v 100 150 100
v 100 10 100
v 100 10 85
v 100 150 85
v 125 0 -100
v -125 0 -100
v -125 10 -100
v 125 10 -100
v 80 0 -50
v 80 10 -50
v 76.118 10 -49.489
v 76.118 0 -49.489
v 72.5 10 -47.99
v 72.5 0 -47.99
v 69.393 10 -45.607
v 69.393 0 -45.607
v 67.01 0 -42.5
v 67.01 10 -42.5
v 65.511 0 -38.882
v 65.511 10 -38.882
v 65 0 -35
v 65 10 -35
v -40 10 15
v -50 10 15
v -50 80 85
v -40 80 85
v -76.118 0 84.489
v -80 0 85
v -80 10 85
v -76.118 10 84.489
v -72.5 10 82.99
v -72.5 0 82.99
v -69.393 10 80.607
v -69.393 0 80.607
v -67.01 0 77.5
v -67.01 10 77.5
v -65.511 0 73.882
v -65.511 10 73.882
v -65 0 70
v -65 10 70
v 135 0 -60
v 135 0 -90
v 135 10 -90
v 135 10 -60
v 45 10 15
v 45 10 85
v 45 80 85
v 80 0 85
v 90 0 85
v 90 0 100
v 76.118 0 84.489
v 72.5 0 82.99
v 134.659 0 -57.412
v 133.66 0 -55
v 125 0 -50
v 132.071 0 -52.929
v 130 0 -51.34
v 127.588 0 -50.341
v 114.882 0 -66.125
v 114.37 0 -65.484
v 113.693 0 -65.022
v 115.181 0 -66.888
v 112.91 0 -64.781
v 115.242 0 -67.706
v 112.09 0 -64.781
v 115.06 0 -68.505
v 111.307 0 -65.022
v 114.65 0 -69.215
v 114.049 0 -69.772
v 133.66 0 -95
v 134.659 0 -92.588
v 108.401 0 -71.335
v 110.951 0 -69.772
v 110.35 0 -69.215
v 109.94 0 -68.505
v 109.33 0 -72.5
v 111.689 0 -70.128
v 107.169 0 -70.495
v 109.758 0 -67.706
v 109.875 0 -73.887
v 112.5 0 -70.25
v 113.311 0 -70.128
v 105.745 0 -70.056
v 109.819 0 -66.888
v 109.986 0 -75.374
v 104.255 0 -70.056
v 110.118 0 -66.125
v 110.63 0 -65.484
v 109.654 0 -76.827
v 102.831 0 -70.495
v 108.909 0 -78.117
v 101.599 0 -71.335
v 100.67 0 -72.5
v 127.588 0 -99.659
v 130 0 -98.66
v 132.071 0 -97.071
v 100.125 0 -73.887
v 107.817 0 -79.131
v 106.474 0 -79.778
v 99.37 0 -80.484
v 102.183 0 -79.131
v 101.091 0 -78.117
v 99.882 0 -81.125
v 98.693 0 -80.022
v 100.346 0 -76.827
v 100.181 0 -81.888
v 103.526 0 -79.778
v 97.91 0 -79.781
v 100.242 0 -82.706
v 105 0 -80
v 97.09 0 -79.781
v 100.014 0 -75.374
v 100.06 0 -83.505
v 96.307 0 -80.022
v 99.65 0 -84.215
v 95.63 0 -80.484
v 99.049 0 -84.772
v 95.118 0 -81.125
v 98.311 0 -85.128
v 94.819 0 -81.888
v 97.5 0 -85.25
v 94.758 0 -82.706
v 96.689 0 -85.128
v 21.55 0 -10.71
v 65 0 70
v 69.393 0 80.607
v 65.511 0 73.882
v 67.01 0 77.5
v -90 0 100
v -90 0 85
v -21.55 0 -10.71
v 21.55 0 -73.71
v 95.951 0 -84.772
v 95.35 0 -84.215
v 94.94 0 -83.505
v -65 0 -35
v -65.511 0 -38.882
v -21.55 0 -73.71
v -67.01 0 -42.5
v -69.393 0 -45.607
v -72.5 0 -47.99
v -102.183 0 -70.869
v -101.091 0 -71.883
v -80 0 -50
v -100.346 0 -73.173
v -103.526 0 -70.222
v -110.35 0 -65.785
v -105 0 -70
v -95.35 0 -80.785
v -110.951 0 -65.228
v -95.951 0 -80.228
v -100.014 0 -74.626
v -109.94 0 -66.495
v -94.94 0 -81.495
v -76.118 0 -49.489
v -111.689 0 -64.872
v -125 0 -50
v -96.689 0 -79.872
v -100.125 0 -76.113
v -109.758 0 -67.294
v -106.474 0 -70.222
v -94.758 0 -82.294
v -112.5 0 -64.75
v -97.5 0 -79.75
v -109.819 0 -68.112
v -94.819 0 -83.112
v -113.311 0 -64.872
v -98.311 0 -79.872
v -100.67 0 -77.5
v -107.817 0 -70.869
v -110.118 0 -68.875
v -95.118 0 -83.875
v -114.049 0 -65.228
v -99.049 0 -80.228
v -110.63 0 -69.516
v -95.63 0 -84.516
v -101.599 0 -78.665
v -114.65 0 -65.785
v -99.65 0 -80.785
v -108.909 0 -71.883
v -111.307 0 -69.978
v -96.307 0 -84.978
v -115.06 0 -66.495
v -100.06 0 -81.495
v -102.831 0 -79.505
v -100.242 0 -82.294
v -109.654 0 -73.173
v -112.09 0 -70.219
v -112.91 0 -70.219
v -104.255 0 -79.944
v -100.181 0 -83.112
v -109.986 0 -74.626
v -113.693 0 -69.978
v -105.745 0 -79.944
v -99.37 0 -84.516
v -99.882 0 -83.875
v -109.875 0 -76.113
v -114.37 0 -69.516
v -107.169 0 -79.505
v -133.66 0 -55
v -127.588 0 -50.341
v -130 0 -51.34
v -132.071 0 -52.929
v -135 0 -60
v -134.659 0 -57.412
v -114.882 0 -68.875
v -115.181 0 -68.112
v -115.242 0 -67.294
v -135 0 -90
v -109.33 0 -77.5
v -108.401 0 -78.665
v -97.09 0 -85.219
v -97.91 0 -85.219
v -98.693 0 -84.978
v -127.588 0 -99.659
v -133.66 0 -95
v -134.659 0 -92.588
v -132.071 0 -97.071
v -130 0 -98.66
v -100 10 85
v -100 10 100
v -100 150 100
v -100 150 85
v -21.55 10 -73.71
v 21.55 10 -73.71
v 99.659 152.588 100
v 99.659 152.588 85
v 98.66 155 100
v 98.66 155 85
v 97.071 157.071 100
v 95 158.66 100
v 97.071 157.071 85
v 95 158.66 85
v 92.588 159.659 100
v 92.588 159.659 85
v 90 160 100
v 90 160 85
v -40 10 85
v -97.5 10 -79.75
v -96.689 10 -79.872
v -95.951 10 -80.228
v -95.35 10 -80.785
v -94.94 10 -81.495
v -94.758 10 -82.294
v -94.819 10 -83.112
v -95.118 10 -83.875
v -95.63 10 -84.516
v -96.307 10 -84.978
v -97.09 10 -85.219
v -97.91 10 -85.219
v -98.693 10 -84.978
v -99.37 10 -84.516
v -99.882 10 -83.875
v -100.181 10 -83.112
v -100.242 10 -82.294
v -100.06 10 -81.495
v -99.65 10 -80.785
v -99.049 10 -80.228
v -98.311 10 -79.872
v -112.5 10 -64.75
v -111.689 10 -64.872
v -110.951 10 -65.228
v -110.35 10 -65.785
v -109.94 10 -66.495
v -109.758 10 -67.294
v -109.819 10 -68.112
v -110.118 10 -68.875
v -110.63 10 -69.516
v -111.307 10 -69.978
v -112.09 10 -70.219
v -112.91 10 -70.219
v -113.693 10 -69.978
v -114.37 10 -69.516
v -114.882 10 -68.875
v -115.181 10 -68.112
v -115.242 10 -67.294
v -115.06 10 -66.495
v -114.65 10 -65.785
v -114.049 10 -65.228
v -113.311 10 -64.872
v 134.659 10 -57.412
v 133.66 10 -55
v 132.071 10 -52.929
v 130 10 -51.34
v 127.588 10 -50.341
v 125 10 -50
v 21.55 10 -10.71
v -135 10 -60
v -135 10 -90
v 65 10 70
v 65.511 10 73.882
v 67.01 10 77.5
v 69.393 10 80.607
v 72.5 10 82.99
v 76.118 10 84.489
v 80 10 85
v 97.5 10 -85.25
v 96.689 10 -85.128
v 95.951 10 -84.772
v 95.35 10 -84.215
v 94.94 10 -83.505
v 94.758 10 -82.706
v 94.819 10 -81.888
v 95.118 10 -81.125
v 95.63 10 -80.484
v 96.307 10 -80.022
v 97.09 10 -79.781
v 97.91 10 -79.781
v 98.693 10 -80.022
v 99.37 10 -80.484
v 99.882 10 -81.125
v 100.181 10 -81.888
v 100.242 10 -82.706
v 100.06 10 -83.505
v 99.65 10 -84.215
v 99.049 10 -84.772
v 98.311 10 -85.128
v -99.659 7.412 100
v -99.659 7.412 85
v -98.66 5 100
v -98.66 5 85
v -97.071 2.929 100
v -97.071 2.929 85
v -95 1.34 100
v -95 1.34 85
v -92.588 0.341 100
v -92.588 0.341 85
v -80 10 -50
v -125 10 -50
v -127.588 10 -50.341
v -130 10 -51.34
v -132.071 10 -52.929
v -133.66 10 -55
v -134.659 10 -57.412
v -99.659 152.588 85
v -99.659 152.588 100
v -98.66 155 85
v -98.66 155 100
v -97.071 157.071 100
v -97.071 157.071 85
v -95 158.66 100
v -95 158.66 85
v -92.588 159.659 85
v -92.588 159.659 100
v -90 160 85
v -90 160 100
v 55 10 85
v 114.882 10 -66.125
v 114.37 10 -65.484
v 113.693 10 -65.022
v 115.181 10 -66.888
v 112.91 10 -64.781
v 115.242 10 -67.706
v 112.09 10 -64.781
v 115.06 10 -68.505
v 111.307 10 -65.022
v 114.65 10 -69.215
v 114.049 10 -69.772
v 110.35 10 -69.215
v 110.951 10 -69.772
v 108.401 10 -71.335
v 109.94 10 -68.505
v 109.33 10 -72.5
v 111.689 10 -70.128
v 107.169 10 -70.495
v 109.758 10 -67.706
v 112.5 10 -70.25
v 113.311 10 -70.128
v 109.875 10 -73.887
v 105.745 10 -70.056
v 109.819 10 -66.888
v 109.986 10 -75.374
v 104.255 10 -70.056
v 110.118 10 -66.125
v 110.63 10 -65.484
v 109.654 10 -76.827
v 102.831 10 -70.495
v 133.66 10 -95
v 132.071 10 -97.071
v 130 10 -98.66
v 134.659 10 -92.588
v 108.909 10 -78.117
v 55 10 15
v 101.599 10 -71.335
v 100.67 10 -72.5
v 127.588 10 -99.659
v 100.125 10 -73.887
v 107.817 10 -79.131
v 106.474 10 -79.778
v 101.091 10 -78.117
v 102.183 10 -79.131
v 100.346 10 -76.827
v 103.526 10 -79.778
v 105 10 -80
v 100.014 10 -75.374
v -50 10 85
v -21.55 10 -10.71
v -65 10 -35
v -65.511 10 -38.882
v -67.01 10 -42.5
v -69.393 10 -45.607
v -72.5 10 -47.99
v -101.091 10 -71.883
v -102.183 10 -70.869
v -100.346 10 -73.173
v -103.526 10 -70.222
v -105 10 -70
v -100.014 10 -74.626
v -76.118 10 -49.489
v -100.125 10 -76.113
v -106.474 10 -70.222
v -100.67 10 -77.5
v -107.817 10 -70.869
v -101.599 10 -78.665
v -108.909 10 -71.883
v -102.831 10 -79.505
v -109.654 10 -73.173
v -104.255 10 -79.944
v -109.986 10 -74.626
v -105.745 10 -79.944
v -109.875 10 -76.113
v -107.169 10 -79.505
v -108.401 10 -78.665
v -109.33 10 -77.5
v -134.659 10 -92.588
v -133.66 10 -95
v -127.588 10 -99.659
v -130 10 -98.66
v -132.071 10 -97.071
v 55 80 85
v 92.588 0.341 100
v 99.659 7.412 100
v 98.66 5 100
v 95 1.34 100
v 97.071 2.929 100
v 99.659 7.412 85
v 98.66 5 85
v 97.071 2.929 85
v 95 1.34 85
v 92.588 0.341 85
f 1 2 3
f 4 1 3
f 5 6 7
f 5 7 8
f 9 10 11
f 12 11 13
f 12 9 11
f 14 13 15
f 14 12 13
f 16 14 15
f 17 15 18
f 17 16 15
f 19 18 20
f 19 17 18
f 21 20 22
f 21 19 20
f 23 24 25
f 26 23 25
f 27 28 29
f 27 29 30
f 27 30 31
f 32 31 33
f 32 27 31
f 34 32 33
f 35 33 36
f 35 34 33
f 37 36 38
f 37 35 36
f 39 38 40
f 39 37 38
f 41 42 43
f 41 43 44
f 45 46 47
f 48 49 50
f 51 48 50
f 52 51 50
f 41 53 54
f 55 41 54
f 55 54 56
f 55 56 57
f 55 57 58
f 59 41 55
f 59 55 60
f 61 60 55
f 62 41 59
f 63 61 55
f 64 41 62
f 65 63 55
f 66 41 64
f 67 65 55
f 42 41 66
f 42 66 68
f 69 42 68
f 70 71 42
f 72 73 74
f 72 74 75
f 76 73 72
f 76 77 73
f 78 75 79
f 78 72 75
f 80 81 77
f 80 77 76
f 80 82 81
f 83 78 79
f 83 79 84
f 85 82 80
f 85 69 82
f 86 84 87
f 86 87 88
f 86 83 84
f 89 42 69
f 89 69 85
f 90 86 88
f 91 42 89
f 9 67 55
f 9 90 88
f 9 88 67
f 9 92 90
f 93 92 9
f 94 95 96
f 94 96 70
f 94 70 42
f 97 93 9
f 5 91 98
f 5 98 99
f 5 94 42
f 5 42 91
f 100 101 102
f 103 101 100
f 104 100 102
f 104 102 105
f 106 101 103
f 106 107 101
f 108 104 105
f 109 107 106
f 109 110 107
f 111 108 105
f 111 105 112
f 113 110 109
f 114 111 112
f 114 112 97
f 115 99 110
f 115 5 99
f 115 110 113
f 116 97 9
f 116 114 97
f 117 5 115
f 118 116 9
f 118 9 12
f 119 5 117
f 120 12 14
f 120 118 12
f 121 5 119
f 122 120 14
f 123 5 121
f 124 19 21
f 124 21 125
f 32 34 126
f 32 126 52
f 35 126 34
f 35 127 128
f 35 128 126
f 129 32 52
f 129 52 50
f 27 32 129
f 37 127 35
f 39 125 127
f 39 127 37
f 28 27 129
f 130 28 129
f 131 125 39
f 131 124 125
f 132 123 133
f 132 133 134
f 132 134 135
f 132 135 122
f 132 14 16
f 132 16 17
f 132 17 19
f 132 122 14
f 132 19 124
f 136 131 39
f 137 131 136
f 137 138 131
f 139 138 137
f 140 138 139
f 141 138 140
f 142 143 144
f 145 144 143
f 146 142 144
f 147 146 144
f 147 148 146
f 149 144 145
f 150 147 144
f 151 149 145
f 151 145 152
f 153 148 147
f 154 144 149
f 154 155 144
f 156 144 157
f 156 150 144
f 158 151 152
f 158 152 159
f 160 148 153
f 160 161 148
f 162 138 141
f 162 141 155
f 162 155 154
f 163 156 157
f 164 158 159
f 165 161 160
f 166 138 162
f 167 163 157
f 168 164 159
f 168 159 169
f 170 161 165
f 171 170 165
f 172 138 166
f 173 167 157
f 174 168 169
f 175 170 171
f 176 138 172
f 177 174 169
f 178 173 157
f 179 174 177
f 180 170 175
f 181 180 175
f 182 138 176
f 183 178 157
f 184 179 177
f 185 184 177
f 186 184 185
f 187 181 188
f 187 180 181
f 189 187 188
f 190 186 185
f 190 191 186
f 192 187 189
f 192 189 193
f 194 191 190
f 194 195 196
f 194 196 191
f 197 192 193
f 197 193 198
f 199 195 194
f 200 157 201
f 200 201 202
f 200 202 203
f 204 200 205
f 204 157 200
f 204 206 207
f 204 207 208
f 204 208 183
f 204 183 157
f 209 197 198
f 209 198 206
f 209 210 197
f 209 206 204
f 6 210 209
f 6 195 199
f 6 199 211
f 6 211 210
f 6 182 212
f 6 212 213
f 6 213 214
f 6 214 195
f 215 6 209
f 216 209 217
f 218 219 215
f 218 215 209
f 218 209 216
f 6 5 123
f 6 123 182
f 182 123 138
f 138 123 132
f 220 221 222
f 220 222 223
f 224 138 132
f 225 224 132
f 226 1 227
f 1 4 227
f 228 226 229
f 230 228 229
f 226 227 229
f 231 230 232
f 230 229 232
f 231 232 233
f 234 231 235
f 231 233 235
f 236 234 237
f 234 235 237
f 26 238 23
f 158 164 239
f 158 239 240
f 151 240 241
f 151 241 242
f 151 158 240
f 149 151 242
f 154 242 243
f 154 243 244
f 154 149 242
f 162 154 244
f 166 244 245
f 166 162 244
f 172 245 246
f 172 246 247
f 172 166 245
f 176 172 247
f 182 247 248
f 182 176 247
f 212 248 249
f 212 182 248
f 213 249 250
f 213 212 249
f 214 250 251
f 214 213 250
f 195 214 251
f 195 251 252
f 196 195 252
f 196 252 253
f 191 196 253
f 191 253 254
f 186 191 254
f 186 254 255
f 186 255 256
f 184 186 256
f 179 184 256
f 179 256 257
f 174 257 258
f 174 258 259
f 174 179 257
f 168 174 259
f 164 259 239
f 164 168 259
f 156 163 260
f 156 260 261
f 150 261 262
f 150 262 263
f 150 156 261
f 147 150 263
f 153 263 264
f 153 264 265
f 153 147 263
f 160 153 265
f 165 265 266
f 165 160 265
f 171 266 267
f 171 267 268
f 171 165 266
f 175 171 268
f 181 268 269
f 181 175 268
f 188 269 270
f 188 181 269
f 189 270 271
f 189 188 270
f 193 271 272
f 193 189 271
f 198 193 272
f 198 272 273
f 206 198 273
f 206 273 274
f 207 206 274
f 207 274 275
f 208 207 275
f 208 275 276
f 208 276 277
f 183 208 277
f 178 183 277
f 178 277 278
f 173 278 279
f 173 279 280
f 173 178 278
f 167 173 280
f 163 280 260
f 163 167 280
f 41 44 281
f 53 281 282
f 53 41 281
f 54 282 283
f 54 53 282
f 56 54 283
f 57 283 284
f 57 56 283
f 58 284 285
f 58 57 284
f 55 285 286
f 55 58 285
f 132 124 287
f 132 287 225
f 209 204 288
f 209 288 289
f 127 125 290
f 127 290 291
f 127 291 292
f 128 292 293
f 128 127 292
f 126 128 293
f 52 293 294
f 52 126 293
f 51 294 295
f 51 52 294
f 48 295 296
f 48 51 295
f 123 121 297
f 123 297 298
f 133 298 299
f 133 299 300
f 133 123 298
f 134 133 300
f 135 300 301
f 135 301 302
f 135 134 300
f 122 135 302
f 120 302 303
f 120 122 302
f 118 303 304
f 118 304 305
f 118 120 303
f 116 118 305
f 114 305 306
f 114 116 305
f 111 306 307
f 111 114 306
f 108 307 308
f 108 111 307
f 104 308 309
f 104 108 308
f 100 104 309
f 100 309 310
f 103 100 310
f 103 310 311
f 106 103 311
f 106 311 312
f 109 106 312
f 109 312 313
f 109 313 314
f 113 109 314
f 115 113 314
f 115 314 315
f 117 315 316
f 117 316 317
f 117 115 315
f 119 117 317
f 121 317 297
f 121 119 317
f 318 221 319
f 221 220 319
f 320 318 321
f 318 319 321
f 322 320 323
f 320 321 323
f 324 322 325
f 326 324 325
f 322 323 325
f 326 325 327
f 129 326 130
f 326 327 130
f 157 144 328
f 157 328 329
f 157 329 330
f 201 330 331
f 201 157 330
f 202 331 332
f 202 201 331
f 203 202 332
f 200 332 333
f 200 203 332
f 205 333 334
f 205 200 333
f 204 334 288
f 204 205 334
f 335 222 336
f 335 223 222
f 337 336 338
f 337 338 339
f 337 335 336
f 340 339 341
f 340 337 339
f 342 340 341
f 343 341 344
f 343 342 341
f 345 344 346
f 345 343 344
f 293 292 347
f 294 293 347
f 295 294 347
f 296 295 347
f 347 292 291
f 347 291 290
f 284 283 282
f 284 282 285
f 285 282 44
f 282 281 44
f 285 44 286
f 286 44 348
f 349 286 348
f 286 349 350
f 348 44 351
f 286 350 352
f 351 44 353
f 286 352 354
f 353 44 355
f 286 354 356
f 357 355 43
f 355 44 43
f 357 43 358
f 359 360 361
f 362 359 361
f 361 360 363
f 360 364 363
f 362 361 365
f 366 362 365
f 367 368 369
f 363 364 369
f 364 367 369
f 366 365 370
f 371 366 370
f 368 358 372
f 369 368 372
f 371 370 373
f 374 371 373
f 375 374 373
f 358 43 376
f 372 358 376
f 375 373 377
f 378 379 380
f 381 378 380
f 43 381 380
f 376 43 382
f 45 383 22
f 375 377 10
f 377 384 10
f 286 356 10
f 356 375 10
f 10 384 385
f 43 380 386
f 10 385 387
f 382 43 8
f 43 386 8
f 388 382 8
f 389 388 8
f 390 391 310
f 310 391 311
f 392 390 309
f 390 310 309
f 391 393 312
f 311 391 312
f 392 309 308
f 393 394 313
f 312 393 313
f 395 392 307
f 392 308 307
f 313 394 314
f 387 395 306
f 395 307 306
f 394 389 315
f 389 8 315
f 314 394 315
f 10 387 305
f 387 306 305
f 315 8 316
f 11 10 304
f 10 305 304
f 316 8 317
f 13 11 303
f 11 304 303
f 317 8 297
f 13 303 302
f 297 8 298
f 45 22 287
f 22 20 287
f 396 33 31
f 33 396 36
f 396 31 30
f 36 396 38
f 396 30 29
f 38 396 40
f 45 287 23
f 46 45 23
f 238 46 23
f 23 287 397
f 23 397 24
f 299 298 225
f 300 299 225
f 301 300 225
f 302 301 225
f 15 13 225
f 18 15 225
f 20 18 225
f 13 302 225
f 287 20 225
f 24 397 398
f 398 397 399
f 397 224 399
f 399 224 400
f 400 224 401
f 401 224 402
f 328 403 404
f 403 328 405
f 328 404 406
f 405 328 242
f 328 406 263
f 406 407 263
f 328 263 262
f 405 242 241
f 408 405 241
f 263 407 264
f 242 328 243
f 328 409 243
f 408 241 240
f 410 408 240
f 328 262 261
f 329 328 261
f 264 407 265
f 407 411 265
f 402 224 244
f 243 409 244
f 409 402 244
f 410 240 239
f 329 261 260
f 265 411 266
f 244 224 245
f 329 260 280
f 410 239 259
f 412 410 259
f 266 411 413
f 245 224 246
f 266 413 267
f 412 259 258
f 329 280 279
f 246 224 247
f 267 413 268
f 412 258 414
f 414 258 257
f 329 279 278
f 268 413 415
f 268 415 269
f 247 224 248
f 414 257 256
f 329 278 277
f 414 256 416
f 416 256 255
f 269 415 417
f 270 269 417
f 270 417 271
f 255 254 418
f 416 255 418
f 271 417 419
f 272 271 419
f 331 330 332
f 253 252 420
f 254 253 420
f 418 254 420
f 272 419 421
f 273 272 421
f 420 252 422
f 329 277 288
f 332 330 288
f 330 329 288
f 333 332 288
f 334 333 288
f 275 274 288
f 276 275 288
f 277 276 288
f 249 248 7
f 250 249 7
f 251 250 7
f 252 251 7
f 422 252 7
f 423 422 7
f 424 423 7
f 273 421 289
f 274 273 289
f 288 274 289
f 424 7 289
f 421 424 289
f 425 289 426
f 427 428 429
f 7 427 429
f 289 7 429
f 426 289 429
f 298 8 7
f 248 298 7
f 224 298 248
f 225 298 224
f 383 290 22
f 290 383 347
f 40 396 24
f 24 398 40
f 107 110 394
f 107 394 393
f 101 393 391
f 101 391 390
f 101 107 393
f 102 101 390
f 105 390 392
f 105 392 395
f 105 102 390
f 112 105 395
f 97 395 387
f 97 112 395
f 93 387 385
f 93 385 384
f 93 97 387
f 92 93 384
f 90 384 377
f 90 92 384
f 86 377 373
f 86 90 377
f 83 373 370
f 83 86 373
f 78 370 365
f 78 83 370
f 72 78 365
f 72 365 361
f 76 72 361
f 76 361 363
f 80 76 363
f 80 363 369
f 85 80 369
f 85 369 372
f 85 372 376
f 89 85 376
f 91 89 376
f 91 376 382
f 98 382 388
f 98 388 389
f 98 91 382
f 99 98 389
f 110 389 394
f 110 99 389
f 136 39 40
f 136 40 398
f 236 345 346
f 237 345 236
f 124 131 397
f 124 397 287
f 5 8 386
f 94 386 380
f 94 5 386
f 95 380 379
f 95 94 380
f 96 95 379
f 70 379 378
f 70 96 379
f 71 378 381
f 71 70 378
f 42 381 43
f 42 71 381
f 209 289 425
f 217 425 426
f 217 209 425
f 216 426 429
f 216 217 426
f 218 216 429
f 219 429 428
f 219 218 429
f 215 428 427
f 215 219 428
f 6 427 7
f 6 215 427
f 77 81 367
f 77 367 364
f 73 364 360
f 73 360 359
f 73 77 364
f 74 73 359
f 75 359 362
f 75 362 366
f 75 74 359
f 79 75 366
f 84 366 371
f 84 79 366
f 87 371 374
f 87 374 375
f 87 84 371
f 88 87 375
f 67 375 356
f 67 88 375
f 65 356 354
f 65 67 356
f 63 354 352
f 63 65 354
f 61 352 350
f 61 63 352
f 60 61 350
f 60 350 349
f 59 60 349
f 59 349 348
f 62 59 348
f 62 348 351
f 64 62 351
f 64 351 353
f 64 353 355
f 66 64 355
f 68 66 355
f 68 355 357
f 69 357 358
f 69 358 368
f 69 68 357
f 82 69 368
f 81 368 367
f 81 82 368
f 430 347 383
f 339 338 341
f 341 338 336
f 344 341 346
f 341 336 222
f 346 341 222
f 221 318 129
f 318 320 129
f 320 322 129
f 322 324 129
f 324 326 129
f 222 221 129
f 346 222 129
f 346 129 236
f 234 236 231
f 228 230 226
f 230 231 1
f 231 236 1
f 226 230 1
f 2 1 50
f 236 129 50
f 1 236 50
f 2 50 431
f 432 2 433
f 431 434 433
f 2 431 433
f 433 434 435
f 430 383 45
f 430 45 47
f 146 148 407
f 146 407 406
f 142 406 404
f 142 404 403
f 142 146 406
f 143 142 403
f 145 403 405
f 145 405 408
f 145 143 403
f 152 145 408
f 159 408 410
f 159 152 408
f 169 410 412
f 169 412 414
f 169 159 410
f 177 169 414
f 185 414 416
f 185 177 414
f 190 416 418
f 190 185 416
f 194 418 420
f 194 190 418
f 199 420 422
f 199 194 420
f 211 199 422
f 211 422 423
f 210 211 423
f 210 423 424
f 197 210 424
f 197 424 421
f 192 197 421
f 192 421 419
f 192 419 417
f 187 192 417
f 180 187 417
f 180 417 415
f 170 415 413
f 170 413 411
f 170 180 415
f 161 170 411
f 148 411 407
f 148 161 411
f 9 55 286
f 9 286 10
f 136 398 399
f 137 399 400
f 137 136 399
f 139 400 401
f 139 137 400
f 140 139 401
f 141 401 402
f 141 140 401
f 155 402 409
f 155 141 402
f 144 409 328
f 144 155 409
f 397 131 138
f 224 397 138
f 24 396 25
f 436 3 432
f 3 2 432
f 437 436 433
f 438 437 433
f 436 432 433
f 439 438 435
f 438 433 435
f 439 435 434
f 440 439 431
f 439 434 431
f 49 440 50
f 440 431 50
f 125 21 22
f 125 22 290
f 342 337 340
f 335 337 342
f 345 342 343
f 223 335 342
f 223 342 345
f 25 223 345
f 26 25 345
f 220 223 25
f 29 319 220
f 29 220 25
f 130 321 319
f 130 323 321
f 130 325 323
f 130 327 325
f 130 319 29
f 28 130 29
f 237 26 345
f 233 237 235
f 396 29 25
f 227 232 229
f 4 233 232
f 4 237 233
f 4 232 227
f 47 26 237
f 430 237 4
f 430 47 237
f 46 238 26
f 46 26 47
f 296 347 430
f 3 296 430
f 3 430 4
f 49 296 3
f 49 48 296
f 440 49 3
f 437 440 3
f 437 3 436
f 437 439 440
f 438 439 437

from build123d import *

# Parameters (mm, degrees)
SKIZZE1_R                       = 5
SKIZZE1_R_2                     = 2.75
SKIZZE1_W                       = 43.1
SKIZZE1_H                       = 63
AUFSATZ_LINEAR_AUSTRAGEN1_DEPTH = 10
SKIZZE3_W                       = 200
SKIZZE3_H                       = 15
AUFSATZ_LINEAR_AUSTRAGEN2_DEPTH = 150
VERRUNDUNG1_R                   = 10
AUFSATZ_LINEAR_AUSTRAGEN3_DEPTH = 10
AUFSATZ_LINEAR_AUSTRAGEN4_DEPTH = 10


with BuildPart() as part:
    # Skizze1 → Aufsatz-Linear austragen1 (new body)
    with BuildSketch(Plane(origin=(0, 0, 0), x_dir=(1, 0, 0), z_dir=(0, 1, 0))):
        with BuildLine():
            Line((-125, 100), (125, 100))
            ThreePointArc((125, 100), (132.071067812, 97.071067812), (135, 90))
            Line((135, 90), (135, 60))
            ThreePointArc((135, 60), (132.071067812, 52.928932188), (125, 50))
            Line((125, 50), (80, 50))
            ThreePointArc((80, 50), (69.393398282, 45.606601718), (65, 35))
            Line((65, 35), (65, -70))
            ThreePointArc((65, -70), (69.393398282, -80.606601718), (80, -85))
            Line((80, -85), (90, -85))
            Line((90, -85), (100, -85))
            Line((100, -85), (100, -100))
            Line((100, -100), (80, -100))
            Line((80, -100), (-80, -100))
            Line((-80, -100), (-100, -100))
            Line((-100, -100), (-100, -85))
            Line((-100, -85), (-90, -85))
            Line((-90, -85), (-80, -85))
            ThreePointArc((-80, -85), (-69.393398282, -80.606601718), (-65, -70))
            Line((-65, -70), (-65, 35))
            ThreePointArc((-65, 35), (-69.393398282, 45.606601718), (-80, 50))
            Line((-80, 50), (-125, 50))
            ThreePointArc((-125, 50), (-132.071067812, 52.928932188), (-135, 60))
            Line((-135, 60), (-135, 90))
            ThreePointArc((-135, 90), (-132.071067812, 97.071067812), (-125, 100))
        make_face()
        with Locations(Location((-105, 75, 0), (0, 0, 270))):
            Circle(SKIZZE1_R, mode=Mode.SUBTRACT)
        with Locations(Location((105, 75, 0), (0, 0, 90))):
            Circle(SKIZZE1_R, mode=Mode.SUBTRACT)
        with Locations(Location((-97.5, 82.5, 0), (0, 0, 270))):
            Circle(SKIZZE1_R_2, mode=Mode.SUBTRACT)
        with Locations(Location((-112.5, 67.5, 0), (0, 0, 270))):
            Circle(SKIZZE1_R_2, mode=Mode.SUBTRACT)
        with Locations(Location((97.5, 82.5, 0), (0, 0, 90))):
            Circle(SKIZZE1_R_2, mode=Mode.SUBTRACT)
        with Locations(Location((112.5, 67.5, 0), (0, 0, 90))):
            Circle(SKIZZE1_R_2, mode=Mode.SUBTRACT)
        with Locations((0, 42.21)):
            Rectangle(SKIZZE1_W, SKIZZE1_H, mode=Mode.SUBTRACT)
    extrude(amount=AUFSATZ_LINEAR_AUSTRAGEN1_DEPTH)

    # Skizze3 → Aufsatz-Linear austragen2 (add)
    with BuildSketch(Plane(origin=(0, 10, 0), x_dir=(1, 0, 0), z_dir=(0, 1, 0))):
        with Locations((0, -92.5)):
            Rectangle(SKIZZE3_W, SKIZZE3_H)
    extrude(amount=AUFSATZ_LINEAR_AUSTRAGEN2_DEPTH)

    # Verrundung1
    verrundung1_edges = [part.edges().sort_by_distance(p)[0] for p in [
        (-100, 160, 92.5),
        (100, 160, 92.5),
        (100, 0, 92.5),
        (-100, 0, 92.5),
    ]]
    fillet(verrundung1_edges, radius=VERRUNDUNG1_R)

    # Skizze5 → Aufsatz-Linear austragen3 (add)
    with BuildSketch(Plane.ZY.offset(50)):
        Polygon((15, 10), (85, 80), (85, 10), align=None)
    extrude(amount=-AUFSATZ_LINEAR_AUSTRAGEN3_DEPTH)

    # Skizze6 → Aufsatz-Linear austragen4 (add)
    with BuildSketch(Plane(origin=(55, 0, 0), x_dir=(0, 0, -1), z_dir=(1, 0, 0))):
        Polygon((-15, 10), (-85, 80), (-85, 10), align=None)
    extrude(amount=-AUFSATZ_LINEAR_AUSTRAGEN4_DEPTH)


solid = part.part
